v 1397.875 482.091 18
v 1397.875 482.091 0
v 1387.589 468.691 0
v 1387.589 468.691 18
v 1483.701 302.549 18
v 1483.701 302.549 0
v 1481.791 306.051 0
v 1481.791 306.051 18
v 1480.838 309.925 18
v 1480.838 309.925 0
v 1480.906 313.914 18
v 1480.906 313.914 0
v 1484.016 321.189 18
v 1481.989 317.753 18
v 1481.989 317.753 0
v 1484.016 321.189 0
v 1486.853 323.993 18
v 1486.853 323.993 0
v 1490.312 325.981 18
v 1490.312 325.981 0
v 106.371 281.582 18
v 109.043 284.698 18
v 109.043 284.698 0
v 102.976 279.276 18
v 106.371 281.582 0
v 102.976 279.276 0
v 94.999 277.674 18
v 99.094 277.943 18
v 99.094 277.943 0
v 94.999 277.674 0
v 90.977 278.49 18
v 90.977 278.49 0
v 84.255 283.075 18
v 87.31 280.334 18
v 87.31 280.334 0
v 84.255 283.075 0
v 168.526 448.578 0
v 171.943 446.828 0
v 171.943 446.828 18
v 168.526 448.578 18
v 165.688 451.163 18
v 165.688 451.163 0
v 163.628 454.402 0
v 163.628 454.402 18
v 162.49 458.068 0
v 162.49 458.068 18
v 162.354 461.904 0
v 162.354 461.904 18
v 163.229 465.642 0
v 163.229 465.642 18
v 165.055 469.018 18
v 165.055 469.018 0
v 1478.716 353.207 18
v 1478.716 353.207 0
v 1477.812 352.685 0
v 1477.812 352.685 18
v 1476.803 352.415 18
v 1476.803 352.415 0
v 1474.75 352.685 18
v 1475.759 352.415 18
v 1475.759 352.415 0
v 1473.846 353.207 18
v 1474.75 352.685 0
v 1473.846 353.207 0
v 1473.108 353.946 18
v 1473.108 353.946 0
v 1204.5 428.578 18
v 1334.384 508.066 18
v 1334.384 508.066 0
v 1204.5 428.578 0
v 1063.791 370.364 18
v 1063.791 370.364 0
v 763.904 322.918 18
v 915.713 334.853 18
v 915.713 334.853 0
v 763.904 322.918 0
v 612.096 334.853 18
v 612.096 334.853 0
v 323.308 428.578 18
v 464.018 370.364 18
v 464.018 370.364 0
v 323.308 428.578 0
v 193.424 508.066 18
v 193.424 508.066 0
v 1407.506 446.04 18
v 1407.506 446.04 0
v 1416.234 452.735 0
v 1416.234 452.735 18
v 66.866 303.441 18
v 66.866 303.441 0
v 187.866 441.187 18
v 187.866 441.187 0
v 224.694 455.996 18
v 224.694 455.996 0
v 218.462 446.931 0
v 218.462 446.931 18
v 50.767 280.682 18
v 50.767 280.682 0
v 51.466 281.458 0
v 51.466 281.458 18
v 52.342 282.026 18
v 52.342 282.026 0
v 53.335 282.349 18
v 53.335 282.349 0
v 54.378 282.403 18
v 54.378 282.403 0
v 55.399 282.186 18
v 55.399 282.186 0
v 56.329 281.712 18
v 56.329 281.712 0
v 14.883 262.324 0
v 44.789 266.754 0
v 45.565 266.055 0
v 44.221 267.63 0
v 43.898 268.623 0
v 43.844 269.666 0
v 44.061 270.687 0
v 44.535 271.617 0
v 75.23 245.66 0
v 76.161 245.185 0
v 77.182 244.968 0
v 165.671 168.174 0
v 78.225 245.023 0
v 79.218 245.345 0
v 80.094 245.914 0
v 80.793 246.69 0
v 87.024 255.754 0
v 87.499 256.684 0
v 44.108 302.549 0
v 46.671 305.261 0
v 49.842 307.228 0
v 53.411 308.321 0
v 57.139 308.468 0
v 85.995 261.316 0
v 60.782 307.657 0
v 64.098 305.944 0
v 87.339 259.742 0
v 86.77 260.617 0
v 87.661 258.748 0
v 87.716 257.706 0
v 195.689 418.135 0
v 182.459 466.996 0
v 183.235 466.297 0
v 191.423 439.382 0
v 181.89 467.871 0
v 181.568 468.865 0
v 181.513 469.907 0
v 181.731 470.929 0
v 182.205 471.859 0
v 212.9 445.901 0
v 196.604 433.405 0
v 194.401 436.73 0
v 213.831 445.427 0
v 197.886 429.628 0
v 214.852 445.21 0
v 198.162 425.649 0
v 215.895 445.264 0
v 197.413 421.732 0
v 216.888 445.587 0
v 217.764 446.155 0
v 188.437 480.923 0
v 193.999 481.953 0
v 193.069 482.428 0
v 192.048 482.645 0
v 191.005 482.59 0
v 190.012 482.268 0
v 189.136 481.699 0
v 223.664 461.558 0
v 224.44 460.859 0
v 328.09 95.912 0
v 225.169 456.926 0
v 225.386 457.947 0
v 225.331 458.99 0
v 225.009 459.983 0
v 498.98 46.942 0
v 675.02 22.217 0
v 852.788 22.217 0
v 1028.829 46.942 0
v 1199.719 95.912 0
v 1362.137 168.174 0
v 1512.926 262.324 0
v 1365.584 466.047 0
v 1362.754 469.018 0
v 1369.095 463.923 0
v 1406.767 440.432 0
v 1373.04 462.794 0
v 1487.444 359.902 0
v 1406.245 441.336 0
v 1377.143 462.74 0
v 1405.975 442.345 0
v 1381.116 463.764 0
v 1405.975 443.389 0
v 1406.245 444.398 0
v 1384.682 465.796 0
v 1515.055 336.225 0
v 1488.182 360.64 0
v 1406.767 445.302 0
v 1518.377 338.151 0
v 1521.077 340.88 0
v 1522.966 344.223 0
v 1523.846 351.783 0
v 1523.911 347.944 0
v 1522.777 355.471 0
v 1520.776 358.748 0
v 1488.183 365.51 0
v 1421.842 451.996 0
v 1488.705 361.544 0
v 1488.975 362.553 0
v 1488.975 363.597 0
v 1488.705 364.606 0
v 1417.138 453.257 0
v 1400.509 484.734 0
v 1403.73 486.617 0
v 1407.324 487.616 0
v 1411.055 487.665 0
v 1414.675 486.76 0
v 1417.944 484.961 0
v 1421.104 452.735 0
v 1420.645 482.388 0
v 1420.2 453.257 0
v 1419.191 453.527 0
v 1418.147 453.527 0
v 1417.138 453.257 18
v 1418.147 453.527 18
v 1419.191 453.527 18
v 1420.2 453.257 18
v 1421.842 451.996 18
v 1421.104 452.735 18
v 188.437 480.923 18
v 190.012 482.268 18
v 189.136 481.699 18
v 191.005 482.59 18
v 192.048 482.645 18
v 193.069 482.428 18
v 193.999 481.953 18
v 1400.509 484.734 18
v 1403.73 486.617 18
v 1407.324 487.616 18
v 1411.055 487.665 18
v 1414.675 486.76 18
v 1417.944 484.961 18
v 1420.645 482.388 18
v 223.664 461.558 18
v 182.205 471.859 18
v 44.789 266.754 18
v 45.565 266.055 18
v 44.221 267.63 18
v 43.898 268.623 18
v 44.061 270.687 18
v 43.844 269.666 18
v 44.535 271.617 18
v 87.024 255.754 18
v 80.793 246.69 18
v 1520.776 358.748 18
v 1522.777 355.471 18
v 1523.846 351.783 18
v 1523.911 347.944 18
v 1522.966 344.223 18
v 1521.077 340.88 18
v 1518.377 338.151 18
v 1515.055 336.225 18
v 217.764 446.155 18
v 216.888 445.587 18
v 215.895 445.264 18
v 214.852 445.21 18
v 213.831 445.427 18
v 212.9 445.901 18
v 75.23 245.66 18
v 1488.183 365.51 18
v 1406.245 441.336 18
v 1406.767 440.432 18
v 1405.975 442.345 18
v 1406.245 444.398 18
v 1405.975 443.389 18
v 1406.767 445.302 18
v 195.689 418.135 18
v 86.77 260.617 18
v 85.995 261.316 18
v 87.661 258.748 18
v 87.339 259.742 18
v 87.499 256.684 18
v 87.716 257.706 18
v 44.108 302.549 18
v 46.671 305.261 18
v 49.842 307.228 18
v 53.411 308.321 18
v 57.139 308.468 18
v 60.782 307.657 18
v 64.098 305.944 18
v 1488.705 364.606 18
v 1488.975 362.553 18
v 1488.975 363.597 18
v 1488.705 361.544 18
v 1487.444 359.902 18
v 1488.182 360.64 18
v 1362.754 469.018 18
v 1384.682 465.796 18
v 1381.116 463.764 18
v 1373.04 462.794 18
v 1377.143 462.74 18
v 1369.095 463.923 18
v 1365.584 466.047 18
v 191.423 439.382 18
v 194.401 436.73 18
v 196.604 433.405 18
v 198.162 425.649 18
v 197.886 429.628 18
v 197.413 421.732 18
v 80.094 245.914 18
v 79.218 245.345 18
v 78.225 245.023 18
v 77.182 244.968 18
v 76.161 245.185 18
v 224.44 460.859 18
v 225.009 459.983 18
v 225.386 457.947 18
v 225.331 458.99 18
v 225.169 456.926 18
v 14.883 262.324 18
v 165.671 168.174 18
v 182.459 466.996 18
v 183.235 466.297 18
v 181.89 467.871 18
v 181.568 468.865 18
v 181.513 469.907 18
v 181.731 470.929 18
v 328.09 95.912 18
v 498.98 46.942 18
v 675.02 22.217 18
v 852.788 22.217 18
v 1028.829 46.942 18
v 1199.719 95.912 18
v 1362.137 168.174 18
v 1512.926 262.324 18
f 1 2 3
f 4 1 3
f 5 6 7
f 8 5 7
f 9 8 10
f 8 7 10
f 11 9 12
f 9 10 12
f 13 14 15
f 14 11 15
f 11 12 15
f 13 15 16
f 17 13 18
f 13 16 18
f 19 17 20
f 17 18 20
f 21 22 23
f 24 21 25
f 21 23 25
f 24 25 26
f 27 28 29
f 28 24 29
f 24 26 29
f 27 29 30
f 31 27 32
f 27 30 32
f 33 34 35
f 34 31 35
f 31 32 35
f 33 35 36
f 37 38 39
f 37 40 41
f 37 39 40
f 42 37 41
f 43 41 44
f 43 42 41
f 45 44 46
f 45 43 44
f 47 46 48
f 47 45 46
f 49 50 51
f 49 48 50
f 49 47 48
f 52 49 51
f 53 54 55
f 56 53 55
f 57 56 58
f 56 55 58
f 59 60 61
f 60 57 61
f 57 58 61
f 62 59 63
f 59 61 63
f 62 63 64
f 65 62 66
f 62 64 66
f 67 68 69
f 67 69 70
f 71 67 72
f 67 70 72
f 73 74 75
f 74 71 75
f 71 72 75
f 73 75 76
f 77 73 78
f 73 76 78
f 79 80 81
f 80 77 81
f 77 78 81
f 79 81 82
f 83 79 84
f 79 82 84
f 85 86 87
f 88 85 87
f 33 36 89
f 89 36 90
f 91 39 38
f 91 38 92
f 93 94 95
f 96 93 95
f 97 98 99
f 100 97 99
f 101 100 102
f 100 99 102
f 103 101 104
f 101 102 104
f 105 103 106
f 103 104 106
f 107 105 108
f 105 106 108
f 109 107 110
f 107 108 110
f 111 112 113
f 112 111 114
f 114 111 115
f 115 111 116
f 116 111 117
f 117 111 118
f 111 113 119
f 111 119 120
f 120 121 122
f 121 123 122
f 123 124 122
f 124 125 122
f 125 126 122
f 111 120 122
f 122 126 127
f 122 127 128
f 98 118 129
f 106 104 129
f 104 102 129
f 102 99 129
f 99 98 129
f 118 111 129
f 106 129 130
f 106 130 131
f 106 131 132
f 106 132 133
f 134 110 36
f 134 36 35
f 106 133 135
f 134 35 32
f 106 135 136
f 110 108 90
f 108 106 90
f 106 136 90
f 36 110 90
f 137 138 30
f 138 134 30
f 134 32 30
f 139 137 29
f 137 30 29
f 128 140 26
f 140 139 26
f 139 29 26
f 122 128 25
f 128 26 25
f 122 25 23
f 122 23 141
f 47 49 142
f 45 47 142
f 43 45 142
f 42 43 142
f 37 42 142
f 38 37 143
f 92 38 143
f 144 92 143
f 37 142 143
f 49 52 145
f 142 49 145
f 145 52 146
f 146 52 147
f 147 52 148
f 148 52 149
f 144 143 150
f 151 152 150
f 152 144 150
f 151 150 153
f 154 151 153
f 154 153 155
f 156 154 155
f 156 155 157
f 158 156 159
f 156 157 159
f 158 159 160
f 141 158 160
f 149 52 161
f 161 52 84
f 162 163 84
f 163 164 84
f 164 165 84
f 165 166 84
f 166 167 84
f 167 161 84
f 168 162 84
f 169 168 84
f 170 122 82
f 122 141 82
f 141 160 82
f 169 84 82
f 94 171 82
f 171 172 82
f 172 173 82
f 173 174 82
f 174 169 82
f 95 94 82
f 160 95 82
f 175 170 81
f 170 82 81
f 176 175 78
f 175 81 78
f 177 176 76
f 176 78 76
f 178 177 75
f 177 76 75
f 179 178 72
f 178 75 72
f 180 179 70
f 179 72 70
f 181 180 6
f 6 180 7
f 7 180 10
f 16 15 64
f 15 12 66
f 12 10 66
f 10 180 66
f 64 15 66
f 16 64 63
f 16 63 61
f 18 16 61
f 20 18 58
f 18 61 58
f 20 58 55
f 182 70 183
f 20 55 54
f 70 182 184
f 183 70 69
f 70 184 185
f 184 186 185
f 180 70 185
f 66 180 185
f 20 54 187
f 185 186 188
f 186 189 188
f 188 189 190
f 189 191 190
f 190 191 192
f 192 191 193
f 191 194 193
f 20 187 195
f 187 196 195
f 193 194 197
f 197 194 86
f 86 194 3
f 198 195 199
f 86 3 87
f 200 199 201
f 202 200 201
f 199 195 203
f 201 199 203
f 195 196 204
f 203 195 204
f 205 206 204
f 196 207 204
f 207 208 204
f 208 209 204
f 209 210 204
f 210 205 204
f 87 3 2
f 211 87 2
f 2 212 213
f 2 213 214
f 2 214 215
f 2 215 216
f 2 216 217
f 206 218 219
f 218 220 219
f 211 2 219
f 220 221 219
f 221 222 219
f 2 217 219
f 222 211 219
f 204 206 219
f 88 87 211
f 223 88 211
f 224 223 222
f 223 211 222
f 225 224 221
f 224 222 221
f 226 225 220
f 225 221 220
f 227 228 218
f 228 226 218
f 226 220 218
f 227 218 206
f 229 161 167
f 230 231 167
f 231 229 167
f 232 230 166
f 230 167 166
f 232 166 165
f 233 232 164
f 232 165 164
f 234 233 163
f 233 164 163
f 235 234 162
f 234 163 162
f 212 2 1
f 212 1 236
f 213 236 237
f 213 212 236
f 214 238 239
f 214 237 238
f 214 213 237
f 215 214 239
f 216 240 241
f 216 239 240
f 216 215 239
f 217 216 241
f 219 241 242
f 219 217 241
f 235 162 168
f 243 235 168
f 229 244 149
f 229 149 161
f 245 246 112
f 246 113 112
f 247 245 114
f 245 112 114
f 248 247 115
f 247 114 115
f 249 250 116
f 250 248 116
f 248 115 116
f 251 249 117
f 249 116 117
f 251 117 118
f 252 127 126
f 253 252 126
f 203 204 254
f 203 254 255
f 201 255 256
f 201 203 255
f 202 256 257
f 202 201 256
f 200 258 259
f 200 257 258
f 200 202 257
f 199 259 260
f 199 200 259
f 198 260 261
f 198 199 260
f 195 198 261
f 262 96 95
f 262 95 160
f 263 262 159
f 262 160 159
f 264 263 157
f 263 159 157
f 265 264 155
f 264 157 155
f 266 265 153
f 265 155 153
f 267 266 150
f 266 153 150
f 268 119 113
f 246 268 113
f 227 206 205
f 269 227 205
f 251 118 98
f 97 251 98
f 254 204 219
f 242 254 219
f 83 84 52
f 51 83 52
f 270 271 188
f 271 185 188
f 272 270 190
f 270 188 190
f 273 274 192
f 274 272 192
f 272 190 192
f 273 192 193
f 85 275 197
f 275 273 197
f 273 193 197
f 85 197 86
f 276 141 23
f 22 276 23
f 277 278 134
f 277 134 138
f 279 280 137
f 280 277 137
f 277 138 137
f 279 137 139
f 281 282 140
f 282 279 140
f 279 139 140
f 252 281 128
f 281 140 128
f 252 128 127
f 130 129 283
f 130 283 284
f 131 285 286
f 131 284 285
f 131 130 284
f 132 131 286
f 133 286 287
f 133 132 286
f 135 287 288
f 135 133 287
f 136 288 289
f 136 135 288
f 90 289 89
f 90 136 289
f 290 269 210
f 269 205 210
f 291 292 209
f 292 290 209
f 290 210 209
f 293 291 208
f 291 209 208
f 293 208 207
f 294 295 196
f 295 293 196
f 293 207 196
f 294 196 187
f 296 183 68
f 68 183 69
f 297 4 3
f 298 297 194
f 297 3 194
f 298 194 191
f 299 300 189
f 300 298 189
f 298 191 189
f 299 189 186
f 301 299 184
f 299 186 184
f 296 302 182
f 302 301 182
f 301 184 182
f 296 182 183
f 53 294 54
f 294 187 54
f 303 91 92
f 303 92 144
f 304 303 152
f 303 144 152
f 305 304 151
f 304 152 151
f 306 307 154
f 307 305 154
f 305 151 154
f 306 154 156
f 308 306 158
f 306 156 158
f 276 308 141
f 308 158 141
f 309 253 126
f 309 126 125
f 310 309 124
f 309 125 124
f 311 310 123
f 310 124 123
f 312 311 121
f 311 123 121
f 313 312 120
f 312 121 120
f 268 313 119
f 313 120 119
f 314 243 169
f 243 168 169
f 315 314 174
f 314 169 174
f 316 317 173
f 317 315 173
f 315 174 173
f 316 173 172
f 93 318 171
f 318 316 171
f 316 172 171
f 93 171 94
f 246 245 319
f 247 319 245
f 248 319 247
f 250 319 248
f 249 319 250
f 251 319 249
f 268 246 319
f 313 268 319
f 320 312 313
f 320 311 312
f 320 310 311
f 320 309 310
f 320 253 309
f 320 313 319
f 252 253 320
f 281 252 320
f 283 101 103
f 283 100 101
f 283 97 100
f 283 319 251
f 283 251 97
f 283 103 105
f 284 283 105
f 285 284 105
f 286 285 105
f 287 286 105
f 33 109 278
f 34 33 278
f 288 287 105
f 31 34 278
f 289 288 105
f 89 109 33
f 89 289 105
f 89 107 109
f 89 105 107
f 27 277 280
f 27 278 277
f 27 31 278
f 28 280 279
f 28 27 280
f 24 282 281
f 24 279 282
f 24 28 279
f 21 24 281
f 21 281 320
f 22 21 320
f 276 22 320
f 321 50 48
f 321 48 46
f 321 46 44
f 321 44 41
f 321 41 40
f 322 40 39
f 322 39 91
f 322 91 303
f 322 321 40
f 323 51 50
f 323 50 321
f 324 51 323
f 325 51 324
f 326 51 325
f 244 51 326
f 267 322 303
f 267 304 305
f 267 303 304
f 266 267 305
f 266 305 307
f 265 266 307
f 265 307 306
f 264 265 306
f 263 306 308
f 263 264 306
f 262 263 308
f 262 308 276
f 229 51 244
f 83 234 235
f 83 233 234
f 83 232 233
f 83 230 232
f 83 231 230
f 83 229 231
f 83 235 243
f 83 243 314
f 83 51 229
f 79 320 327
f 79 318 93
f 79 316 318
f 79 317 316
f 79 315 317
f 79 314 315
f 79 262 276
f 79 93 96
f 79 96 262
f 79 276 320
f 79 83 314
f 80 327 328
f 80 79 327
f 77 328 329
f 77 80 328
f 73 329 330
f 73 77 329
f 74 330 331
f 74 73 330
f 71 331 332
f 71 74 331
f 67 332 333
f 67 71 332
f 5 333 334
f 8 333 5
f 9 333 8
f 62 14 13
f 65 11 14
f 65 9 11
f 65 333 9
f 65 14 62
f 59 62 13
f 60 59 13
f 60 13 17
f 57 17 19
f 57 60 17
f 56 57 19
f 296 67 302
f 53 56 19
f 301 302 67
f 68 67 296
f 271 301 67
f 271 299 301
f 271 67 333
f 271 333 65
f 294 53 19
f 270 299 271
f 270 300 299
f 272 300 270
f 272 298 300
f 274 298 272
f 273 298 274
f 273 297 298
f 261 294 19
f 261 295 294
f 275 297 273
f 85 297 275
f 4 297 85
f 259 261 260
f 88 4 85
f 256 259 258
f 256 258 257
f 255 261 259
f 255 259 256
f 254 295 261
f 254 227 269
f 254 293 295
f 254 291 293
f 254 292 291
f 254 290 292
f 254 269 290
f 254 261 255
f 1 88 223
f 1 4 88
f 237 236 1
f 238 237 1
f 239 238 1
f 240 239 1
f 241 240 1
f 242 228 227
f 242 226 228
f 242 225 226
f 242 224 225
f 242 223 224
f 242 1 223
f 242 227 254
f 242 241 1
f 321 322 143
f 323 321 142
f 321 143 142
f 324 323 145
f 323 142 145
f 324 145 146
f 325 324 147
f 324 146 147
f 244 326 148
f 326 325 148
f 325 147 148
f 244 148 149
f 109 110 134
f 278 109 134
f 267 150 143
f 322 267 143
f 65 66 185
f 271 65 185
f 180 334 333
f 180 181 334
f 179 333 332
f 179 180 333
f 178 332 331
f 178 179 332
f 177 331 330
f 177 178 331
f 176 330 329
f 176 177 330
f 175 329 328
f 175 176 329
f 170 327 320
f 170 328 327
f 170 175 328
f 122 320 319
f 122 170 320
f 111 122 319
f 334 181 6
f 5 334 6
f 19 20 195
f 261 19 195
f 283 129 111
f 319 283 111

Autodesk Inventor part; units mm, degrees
ref_plane "YZ Plane" through (0, 0, 0) normal (1, 0, 0) x (0, 1, 0)
ref_plane "XZ Plane" through (0, 0, 0) normal (0, 1, 0) x (-1, 0, 0)
ref_plane "XY Plane" through (0, 0, 0) normal (0, 0, 1) x (1, 0, 0)
sketch "CONTOURS" plane through (0, 0, 0) normal (0, 0, 1) x (1, 0, 0)
  line L0 (1512.926, 262.3244) -> (1483.7011, 302.5491)
  arc A0 (1490.3116, 325.9808) -> (1483.7011, 302.5491) centre (1496.2408, 311.6597) ccw
  line L1 (1490.3116, 325.9808) -> (1515.055, 336.2252)
  arc A1 (1515.055, 336.2252) -> (1520.7765, 358.748) centre (1509.5083, 349.6224) ccw
  line L2 (1520.7765, 358.748) -> (1420.6454, 482.3882)
  arc A2 (1420.6454, 482.3882) -> (1397.875, 482.0914) centre (1409.3772, 473.2625) ccw
  line L3 (1397.875, 482.0914) -> (1387.5892, 468.6913)
  arc A3 (1362.754, 469.0184) -> (1387.5892, 468.6913) centre (1375.2938, 478.1291) ccw
  line L4 (1362.754, 469.0184) -> (1334.3843, 508.066)
  arc A4 (193.4245, 508.066) -> (1334.3843, 508.066) centre (763.9044, 1294.3771) ccw
  line L5 (193.4245, 508.066) -> (165.0547, 469.0184)
  arc A5 (165.0547, 469.0184) -> (171.943, 446.828) centre (176.7854, 460.4955) ccw
  line L6 (171.943, 446.828) -> (187.8658, 441.1866)
  arc A6 (195.6892, 418.1351) -> (187.8658, 441.1866) centre (182.6894, 426.5765) ccw
  line L7 (195.6892, 418.1351) -> (109.0426, 284.6979)
  arc A7 (84.2549, 283.0747) -> (109.0426, 284.6979) centre (96.0429, 293.1392) ccw
  line L8 (84.2549, 283.0747) -> (66.8658, 303.4414)
  arc A8 (66.8658, 303.4414) -> (44.1076, 302.5491) centre (55.8384, 294.0262) ccw
  line L9 (44.1076, 302.5491) -> (14.8827, 262.3244)
  arc A9 (14.8827, 262.3244) -> (1512.926, 262.3244) centre (763.9044, 1294.1149) ccw
sketch "HOLES" plane through (0, 0, 0) normal (0, 0, 1) x (1, 0, 0)
  line L0 (224.6944, 455.9957) -> (218.4625, 446.9313)
  arc A0 (212.9002, 445.9014) -> (218.4625, 446.9313) centre (215.1664, 449.1975) ccw
  line L1 (212.9002, 445.9014) -> (183.2349, 466.2968)
  arc A1 (182.205, 471.8591) -> (183.2349, 466.2968) centre (185.5011, 469.5929) ccw
  line L2 (182.205, 471.8591) -> (188.4369, 480.9234)
  arc A2 (193.9992, 481.9534) -> (188.4369, 480.9234) centre (191.733, 478.6573) ccw
  line L3 (193.9992, 481.9534) -> (223.6644, 461.558)
  arc A3 (224.6944, 455.9957) -> (223.6644, 461.558) centre (221.3983, 458.2619) ccw
  line L4 (87.0245, 255.754) -> (80.7926, 246.6896)
  arc A4 (75.2303, 245.6596) -> (80.7926, 246.6896) centre (77.4965, 248.9557) ccw
  line L5 (75.2303, 245.6596) -> (45.5651, 266.055)
  arc A5 (44.5351, 271.6173) -> (45.5651, 266.055) centre (47.8312, 269.3511) ccw
  line L6 (44.5351, 271.6173) -> (50.767, 280.6817)
  arc A6 (56.3293, 281.7117) -> (50.767, 280.6817) centre (54.0631, 278.4155) ccw
  line L7 (56.3293, 281.7117) -> (85.9946, 261.3163)
  arc A7 (87.0245, 255.754) -> (85.9946, 261.3163) centre (83.7284, 258.0201) ccw
  line L8 (1487.4439, 359.9016) -> (1478.716, 353.2066)
  arc A8 (1473.1076, 353.9459) -> (1478.716, 353.2066) centre (1476.2814, 356.3804) ccw
  line L9 (1473.1076, 353.9459) -> (1406.7666, 440.4321)
  arc A9 (1407.5058, 446.0405) -> (1406.7666, 440.4321) centre (1409.9404, 442.8667) ccw
  line L10 (1407.5058, 446.0405) -> (1416.2338, 452.7354)
  arc A10 (1421.8421, 451.9962) -> (1416.2338, 452.7354) centre (1418.6683, 449.5616) ccw
  line L11 (1421.8421, 451.9962) -> (1488.1832, 365.51)
  arc A11 (1487.4439, 359.9016) -> (1488.1832, 365.51) centre (1485.0094, 363.0754) ccw
sketch "LETTERS" plane through (0, 0, 0) normal (0, 0, 1) x (1, 0, 0)
  line L0 (221.0345, 299.5651) -> (214.0787, 303.3807)
  line L1 (214.0787, 303.3807) -> (223.8436, 320.6336)
  line L2 (223.8436, 320.6336) -> (229.7881, 317.2691)
  line L3 (232.463, 314.1509) -> (232.5322, 313.9591)
  line L4 (232.5322, 313.9591) -> (232.5968, 313.7631)
  line L5 (232.5968, 313.7631) -> (232.6568, 313.5633)
  line L6 (232.6568, 313.5633) -> (232.7121, 313.3597)
  line L7 (232.7121, 313.3597) -> (232.7625, 313.1525)
  line L8 (232.7625, 313.1525) -> (232.8082, 312.942)
  line L9 (232.8082, 312.942) -> (232.8489, 312.7282)
  line L10 (232.8489, 312.7282) -> (232.8846, 312.5116)
  line L11 (232.8846, 312.5116) -> (232.9153, 312.2921)
  line L12 (232.9153, 312.2921) -> (232.941, 312.0702)
  line L13 (232.941, 312.0702) -> (232.9616, 311.8459)
  line L14 (232.9616, 311.8459) -> (232.9772, 311.6196)
  line L15 (232.9772, 311.6196) -> (232.9877, 311.3915)
  line L16 (232.9877, 311.3915) -> (232.9931, 311.1618)
  line L17 (232.9931, 311.1618) -> (232.9936, 310.9307)
  line L18 (232.9936, 310.9307) -> (232.989, 310.6985)
  line L19 (232.989, 310.6985) -> (232.9795, 310.4654)
  line L20 (232.9795, 310.4654) -> (232.9651, 310.2317)
  line L21 (232.9651, 310.2317) -> (232.9458, 309.9975)
  line L22 (232.9458, 309.9975) -> (232.9218, 309.7632)
  line L23 (232.9218, 309.7632) -> (232.8931, 309.529)
  line L24 (232.8931, 309.529) -> (232.8598, 309.295)
  line L25 (232.8598, 309.295) -> (232.8219, 309.0616)
  line L26 (232.8219, 309.0616) -> (232.7797, 308.8289)
  line L27 (232.7797, 308.8289) -> (232.7331, 308.5971)
  line L28 (232.7331, 308.5971) -> (232.6823, 308.3664)
  line L29 (232.6823, 308.3664) -> (232.6274, 308.1371)
  line L30 (232.6274, 308.1371) -> (232.5686, 307.9094)
  line L31 (232.5686, 307.9094) -> (232.4396, 307.4592)
  line L32 (232.4396, 307.4592) -> (232.2964, 307.0174)
  line L33 (232.2964, 307.0174) -> (232.14, 306.585)
  line L34 (232.14, 306.585) -> (231.9716, 306.1633)
  line L35 (231.9716, 306.1633) -> (231.7923, 305.7532)
  line L36 (231.6033, 305.3555) -> (231.402, 304.9639)
  line L37 (231.402, 304.9639) -> (231.185, 304.5725)
  line L38 (231.185, 304.5725) -> (230.9521, 304.1826)
  line L39 (230.9521, 304.1826) -> (230.7035, 303.7959)
  line L40 (230.7035, 303.7959) -> (230.4394, 303.4138)
  line L41 (230.4394, 303.4138) -> (230.16, 303.038)
  line L42 (230.16, 303.038) -> (230.0147, 302.853)
  line L43 (230.0147, 302.853) -> (229.8658, 302.6702)
  line L44 (229.8658, 302.6702) -> (229.7134, 302.4898)
  line L45 (229.7134, 302.4898) -> (229.5575, 302.3121)
  line L46 (229.5575, 302.3121) -> (229.3982, 302.1372)
  line L47 (229.3982, 302.1372) -> (229.2357, 301.9654)
  line L48 (229.2357, 301.9654) -> (229.07, 301.7969)
  line L49 (229.07, 301.7969) -> (228.9013, 301.6319)
  line L50 (228.9013, 301.6319) -> (228.7297, 301.4705)
  line L51 (228.7297, 301.4705) -> (228.5554, 301.3131)
  line L52 (228.5554, 301.3131) -> (228.3784, 301.1597)
  line L53 (228.3784, 301.1597) -> (228.1989, 301.0107)
  line L54 (228.1989, 301.0107) -> (228.0172, 300.8661)
  line L55 (228.0172, 300.8661) -> (227.8333, 300.7261)
  line L56 (227.8333, 300.7261) -> (227.6474, 300.591)
  line L57 (227.6474, 300.591) -> (227.4598, 300.4608)
  line L58 (227.4598, 300.4608) -> (227.2705, 300.3358)
  line L59 (227.2705, 300.3358) -> (227.0798, 300.2161)
  line L60 (227.0798, 300.2161) -> (226.8878, 300.1017)
  line L61 (226.8878, 300.1017) -> (226.6948, 299.9929)
  line L62 (229.9244, 317.199) -> (230.0598, 317.1238)
  line L63 (230.0598, 317.1238) -> (230.1939, 317.0436)
  line L64 (230.1939, 317.0436) -> (230.3268, 316.9582)
  line L65 (230.3268, 316.9582) -> (230.4581, 316.8676)
  line L66 (230.4581, 316.8676) -> (230.5878, 316.7718)
  line L67 (230.5878, 316.7718) -> (230.7158, 316.6707)
  line L68 (231.7923, 305.7532) -> (231.6033, 305.3555)
  line L69 (230.7158, 316.6707) -> (230.8417, 316.5642)
  line L70 (230.8417, 316.5642) -> (230.9656, 316.4525)
  line L71 (230.9656, 316.4525) -> (231.0872, 316.3353)
  line L72 (231.0872, 316.3353) -> (231.2064, 316.2128)
  line L73 (231.2064, 316.2128) -> (231.3229, 316.085)
  line L74 (221.173, 299.4993) -> (221.0345, 299.5651)
  line L75 (231.3229, 316.085) -> (231.4367, 315.9518)
  line L76 (231.4367, 315.9518) -> (231.5476, 315.8134)
  line L77 (231.5476, 315.8134) -> (231.6554, 315.6696)
  line L78 (231.6554, 315.6696) -> (231.76, 315.5207)
  line L79 (229.7881, 317.2691) -> (229.9244, 317.199)
  line L80 (231.76, 315.5207) -> (231.8612, 315.3665)
  line L81 (231.8612, 315.3665) -> (231.9589, 315.2073)
  line L82 (231.9589, 315.2073) -> (232.0529, 315.0431)
  line L83 (232.0529, 315.0431) -> (232.1431, 314.874)
  line L84 (232.1431, 314.874) -> (232.2293, 314.7001)
  line L85 (232.2293, 314.7001) -> (232.3115, 314.5216)
  line L86 (232.3115, 314.5216) -> (232.3894, 314.3384)
  line L87 (232.3894, 314.3384) -> (232.463, 314.1509)
  line L88 (221.3149, 299.4374) -> (221.173, 299.4993)
  line L89 (221.4601, 299.3795) -> (221.3149, 299.4374)
  line L90 (221.6085, 299.3258) -> (221.4601, 299.3795)
  line L91 (221.7603, 299.2764) -> (221.6085, 299.3258)
  line L92 (221.9152, 299.2315) -> (221.7603, 299.2764)
  line L93 (222.0732, 299.1913) -> (221.9152, 299.2315)
  line L94 (222.2342, 299.1558) -> (222.0732, 299.1913)
  line L95 (222.3983, 299.1252) -> (222.2342, 299.1558)
  line L96 (222.5652, 299.0997) -> (222.3983, 299.1252)
  line L97 (222.7348, 299.0794) -> (222.5652, 299.0997)
  line L98 (222.9072, 299.0644) -> (222.7348, 299.0794)
  line L99 (223.0821, 299.0548) -> (222.9072, 299.0644)
  line L100 (223.2595, 299.0507) -> (223.0821, 299.0548)
  line L101 (223.4391, 299.0523) -> (223.2595, 299.0507)
  line L102 (223.621, 299.0597) -> (223.4391, 299.0523)
  line L103 (223.8049, 299.0728) -> (223.621, 299.0597)
  line L104 (223.9907, 299.0918) -> (223.8049, 299.0728)
  line L105 (224.1783, 299.1168) -> (223.9907, 299.0918)
  line L106 (224.3674, 299.1478) -> (224.1783, 299.1168)
  line L107 (224.5579, 299.1849) -> (224.3674, 299.1478)
  line L108 (224.7497, 299.228) -> (224.5579, 299.1849)
  line L109 (224.9425, 299.2773) -> (224.7497, 299.228)
  line L110 (225.1362, 299.3327) -> (224.9425, 299.2773)
  line L111 (225.3306, 299.3942) -> (225.1362, 299.3327)
  line L112 (225.5256, 299.4618) -> (225.3306, 299.3942)
  line L113 (225.7208, 299.5354) -> (225.5256, 299.4618)
  line L114 (225.9161, 299.6151) -> (225.7208, 299.5354)
  line L115 (226.1114, 299.7008) -> (225.9161, 299.6151)
  line L116 (226.3064, 299.7923) -> (226.1114, 299.7008)
  line L117 (226.5009, 299.8898) -> (226.3064, 299.7923)
  line L118 (226.6948, 299.9929) -> (226.5009, 299.8898)
extrude "Extrusion1" add sketch "CONTOURS" along normal blind 18
extrude "Extrusion2" cut sketch "HOLES" along normal blind 18
properties part number "Platform D3" material "Wood (Birch)"
